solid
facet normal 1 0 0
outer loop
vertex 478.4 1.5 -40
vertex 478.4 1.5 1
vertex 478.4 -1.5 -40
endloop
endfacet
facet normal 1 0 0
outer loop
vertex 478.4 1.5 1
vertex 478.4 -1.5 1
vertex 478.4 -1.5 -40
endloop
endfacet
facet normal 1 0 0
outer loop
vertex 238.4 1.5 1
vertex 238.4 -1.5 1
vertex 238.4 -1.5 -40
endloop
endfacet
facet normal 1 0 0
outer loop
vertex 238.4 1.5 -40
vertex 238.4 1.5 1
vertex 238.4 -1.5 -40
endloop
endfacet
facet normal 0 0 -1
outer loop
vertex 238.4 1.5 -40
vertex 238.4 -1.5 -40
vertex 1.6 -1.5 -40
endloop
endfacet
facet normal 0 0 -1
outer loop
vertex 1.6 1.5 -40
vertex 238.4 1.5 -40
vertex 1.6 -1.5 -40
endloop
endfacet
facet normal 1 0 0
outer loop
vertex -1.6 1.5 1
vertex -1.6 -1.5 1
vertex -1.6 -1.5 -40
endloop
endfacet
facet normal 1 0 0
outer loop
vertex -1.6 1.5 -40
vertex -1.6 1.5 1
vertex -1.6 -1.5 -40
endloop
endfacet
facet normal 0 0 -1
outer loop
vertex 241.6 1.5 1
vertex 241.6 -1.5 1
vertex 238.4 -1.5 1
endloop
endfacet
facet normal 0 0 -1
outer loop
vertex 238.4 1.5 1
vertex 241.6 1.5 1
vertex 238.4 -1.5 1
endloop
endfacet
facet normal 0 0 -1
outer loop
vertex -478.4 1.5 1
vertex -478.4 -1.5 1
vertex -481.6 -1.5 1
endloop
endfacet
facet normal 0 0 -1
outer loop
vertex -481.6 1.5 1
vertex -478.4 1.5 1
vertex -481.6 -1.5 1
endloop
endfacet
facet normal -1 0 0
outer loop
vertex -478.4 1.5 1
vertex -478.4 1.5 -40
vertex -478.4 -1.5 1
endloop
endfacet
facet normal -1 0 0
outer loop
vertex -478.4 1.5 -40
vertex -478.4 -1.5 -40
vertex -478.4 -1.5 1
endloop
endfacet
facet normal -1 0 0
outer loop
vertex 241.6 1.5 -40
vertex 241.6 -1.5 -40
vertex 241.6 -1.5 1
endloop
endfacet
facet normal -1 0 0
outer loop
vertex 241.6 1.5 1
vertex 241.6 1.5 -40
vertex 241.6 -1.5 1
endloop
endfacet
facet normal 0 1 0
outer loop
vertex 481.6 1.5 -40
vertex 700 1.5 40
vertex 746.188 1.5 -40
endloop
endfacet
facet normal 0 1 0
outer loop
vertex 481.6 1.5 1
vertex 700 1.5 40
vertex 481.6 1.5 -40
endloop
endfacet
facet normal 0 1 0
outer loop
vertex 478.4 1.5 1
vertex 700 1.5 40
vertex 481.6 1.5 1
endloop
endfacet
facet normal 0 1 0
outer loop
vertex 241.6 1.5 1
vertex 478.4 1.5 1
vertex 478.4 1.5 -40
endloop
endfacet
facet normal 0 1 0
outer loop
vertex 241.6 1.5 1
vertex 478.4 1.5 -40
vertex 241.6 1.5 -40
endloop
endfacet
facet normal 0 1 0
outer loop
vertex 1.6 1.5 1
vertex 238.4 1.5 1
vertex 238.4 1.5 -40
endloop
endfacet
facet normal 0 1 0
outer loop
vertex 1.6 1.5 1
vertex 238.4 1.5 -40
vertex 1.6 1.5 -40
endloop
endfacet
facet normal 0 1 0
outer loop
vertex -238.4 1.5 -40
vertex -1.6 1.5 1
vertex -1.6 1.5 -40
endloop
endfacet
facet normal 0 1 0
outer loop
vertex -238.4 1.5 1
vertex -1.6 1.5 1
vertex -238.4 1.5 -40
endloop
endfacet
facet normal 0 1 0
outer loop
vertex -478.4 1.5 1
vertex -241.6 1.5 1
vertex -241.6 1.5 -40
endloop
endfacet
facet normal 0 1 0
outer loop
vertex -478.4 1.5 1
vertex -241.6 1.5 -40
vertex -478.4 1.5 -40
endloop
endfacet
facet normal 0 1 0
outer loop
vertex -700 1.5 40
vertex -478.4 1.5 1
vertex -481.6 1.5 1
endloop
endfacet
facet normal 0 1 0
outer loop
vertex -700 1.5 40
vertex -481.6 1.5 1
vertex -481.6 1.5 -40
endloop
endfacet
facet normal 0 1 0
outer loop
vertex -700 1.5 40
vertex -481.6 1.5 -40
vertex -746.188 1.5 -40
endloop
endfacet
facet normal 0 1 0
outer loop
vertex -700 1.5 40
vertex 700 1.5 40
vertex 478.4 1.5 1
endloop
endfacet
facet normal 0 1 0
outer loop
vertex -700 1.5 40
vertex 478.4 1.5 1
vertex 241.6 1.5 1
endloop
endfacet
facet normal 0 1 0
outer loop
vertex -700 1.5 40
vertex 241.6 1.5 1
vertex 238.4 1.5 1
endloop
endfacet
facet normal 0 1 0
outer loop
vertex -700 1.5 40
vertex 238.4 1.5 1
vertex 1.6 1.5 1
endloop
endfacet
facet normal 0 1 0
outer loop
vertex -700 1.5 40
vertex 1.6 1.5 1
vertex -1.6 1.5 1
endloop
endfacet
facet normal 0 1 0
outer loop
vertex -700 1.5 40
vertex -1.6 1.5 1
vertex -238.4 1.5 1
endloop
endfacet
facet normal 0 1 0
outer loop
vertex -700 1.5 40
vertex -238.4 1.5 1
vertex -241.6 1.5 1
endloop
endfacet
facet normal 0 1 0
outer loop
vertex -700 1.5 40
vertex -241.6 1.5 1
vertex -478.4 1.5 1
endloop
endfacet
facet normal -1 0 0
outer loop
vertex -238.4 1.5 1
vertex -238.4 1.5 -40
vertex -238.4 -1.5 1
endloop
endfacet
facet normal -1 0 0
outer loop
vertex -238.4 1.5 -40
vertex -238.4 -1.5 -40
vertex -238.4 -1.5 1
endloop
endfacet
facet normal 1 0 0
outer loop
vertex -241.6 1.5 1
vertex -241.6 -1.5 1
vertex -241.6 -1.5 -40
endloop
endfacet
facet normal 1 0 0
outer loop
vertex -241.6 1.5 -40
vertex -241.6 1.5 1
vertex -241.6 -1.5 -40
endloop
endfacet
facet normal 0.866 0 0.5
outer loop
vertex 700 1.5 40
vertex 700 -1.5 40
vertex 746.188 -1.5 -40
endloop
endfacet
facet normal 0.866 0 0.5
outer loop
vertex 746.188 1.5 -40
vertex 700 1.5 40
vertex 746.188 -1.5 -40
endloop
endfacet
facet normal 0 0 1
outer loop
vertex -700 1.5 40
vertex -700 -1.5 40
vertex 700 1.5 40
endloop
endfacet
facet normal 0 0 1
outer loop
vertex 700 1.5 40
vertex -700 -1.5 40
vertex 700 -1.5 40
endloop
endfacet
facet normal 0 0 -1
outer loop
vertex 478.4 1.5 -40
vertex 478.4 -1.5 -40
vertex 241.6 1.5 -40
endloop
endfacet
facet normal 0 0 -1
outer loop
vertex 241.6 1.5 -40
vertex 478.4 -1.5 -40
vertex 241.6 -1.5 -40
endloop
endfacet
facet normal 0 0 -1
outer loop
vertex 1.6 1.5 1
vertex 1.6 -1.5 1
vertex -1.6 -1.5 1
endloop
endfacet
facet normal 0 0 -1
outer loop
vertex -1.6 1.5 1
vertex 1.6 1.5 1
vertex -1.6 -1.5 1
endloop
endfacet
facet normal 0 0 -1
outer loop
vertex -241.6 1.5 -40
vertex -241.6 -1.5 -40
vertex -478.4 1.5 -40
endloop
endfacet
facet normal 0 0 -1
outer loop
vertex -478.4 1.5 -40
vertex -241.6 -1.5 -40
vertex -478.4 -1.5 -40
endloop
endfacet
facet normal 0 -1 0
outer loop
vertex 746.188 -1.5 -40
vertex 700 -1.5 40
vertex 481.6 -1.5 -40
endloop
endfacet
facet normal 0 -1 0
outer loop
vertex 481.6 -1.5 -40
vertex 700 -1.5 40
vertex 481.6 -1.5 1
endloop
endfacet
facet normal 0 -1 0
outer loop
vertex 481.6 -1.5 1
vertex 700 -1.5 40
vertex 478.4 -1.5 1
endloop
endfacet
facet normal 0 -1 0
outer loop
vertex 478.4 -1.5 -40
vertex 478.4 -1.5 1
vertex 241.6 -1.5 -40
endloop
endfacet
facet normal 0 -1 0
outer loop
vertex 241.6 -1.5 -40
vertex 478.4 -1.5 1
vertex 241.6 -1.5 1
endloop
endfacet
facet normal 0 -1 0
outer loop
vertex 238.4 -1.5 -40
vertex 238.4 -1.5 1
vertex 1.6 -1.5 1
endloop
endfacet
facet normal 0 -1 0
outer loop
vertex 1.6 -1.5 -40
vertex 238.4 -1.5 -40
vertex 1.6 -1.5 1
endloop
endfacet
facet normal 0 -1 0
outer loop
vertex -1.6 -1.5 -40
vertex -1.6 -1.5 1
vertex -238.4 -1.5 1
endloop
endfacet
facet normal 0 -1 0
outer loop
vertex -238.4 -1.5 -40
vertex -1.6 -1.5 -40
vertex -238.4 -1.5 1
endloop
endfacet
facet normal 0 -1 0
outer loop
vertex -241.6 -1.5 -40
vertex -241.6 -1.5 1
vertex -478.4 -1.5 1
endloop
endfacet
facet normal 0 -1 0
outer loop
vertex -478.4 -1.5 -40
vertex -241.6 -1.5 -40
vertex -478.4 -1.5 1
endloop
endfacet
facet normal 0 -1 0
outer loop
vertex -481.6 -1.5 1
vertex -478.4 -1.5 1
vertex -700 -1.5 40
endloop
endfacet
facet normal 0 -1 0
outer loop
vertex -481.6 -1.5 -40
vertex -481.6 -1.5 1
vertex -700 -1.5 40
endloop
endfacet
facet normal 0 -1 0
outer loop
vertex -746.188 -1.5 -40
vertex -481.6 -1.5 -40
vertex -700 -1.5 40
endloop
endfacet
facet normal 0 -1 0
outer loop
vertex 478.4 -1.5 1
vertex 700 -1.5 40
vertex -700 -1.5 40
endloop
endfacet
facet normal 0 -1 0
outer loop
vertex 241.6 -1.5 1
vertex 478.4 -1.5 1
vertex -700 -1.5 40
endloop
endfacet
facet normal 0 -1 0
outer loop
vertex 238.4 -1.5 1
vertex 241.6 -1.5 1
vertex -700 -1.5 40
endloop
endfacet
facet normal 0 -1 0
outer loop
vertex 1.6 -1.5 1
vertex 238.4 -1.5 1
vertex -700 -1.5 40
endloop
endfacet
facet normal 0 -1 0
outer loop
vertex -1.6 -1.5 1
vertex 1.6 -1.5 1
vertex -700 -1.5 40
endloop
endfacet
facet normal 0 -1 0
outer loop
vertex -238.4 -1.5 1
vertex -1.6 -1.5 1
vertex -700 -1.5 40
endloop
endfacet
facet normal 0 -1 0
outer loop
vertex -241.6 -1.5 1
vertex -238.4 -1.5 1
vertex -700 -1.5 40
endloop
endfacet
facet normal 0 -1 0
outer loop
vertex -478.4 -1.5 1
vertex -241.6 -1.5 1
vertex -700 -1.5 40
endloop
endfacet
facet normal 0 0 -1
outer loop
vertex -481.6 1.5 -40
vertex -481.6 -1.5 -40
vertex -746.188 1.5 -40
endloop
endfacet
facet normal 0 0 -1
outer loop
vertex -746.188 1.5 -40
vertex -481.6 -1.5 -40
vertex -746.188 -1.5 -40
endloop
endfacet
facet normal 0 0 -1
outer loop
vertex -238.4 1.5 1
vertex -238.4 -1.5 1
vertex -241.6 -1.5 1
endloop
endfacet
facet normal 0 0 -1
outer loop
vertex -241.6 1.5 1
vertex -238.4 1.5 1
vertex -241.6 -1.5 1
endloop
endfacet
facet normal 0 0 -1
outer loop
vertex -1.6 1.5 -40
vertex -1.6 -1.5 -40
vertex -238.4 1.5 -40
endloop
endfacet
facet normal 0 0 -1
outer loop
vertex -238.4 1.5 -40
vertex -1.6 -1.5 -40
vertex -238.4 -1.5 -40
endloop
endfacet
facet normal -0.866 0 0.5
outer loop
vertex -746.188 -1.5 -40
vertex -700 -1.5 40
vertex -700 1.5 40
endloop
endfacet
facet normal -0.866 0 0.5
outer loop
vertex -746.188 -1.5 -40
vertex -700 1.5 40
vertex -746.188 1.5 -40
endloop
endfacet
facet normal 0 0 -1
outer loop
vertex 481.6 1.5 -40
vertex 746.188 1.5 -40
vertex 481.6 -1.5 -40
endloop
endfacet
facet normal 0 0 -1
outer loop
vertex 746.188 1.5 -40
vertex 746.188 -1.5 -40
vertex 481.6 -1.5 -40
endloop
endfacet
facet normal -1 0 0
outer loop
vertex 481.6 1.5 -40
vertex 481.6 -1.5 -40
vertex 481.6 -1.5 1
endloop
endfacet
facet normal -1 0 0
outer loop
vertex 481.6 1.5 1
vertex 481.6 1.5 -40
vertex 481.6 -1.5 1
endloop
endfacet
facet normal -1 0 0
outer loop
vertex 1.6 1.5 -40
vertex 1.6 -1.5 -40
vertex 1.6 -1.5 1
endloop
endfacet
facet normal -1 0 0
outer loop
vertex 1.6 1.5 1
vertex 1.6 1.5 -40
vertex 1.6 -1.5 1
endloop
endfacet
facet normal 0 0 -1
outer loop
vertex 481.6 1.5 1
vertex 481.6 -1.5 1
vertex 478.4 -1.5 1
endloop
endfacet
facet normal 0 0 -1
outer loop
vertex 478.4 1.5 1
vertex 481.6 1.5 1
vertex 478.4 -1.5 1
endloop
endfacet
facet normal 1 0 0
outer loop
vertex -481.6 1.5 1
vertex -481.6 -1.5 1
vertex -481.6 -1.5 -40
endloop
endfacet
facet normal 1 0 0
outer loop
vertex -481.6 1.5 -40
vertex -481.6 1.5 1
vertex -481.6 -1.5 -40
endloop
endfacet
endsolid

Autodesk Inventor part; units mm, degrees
ref_plane "YZ Plane" through (0, 0, 0) normal (1, 0, 0) x (0, 1, 0)
ref_plane "XZ Plane" through (0, 0, 0) normal (0, 1, 0) x (-1, 0, 0)
ref_plane "XY Plane" through (0, 0, 0) normal (0, 0, 1) x (1, 0, 0)
sketch "Sketch1" plane through (0, 0, 0) normal (0, 1, 0) x (-1, 0, 0)
  line L0 (900, 40) -> (-900, 40)
  line L1 (-900, 40) -> (-900, -40)
  line L2 (-900, -40) -> (900, -40)
  line L3 (900, -40) -> (900, 40)
  line L4 (900, 40) -> (-900, -40) construction
  line L5 (700, 40) -> (746.188, -40)
  line L6 (0, 40) -> (0, -40) construction
  line L7 (-700, 40) -> (-746.188, -40)
  point P0 (0, 0)
  point P1 (0, 0)
  dimension "d0" = 80
  dimension "d1" = 1800
  dimension "d3" = 120
  dimension "d6" = 700
  dimension "d7" = 120
  dimension "d8" = 700
extrude "Plate1" add sketch "Sketch1" along normal mid plane 3 contours L5 L2 L7 L0
sketch "Sketch2" plane through (0, -1.5, 0) normal (0, -1, 0) x (1, 0, 0)
  line L0 (-1.6, -40) -> (1.6, -40)
  line L1 (1.6, -40) -> (1.6, 1)
  line L2 (1.6, 1) -> (-1.6, 1)
  line L3 (-1.6, 1) -> (-1.6, -40)
  line L4 (746.188, -40) -> (-746.188, -40) projected
  point P0 (0, 0)
  point P1 (0, -40)
  dimension "d9" = 3.2
  dimension "d10" = 41
extrude "Extrusion1" cut sketch "Sketch2" against normal through all
pattern_linear "Rectangular Pattern1" count 5 spacing 240 along (1, 0, 0) of "Extrusion1" first direction both ways yes
equation "\"d7\" = d3"
equation "\"d8\" = d6"
equation "\"d2\" = Thickness"
equation "\"BendReliefWidth\" = Thickness"
equation "\"BendReliefDepth\" = 0.5 * Thickness"
equation "\"CornerReliefSize\" = 4 * Thickness"
equation "\"MinimumRemnant\" = 2 * Thickness"
equation "\"TransitionRadius\" = BendRadius"
equation "\"JacobiRadiusSize\" = BendRadius"
equation "\"GapSize\" = Thickness"
equation "\"Thickness\" = 3"
equation "\"BendRadius\" = 5"
properties part number "MSC 201 GRID" material "Stainless Steel"
